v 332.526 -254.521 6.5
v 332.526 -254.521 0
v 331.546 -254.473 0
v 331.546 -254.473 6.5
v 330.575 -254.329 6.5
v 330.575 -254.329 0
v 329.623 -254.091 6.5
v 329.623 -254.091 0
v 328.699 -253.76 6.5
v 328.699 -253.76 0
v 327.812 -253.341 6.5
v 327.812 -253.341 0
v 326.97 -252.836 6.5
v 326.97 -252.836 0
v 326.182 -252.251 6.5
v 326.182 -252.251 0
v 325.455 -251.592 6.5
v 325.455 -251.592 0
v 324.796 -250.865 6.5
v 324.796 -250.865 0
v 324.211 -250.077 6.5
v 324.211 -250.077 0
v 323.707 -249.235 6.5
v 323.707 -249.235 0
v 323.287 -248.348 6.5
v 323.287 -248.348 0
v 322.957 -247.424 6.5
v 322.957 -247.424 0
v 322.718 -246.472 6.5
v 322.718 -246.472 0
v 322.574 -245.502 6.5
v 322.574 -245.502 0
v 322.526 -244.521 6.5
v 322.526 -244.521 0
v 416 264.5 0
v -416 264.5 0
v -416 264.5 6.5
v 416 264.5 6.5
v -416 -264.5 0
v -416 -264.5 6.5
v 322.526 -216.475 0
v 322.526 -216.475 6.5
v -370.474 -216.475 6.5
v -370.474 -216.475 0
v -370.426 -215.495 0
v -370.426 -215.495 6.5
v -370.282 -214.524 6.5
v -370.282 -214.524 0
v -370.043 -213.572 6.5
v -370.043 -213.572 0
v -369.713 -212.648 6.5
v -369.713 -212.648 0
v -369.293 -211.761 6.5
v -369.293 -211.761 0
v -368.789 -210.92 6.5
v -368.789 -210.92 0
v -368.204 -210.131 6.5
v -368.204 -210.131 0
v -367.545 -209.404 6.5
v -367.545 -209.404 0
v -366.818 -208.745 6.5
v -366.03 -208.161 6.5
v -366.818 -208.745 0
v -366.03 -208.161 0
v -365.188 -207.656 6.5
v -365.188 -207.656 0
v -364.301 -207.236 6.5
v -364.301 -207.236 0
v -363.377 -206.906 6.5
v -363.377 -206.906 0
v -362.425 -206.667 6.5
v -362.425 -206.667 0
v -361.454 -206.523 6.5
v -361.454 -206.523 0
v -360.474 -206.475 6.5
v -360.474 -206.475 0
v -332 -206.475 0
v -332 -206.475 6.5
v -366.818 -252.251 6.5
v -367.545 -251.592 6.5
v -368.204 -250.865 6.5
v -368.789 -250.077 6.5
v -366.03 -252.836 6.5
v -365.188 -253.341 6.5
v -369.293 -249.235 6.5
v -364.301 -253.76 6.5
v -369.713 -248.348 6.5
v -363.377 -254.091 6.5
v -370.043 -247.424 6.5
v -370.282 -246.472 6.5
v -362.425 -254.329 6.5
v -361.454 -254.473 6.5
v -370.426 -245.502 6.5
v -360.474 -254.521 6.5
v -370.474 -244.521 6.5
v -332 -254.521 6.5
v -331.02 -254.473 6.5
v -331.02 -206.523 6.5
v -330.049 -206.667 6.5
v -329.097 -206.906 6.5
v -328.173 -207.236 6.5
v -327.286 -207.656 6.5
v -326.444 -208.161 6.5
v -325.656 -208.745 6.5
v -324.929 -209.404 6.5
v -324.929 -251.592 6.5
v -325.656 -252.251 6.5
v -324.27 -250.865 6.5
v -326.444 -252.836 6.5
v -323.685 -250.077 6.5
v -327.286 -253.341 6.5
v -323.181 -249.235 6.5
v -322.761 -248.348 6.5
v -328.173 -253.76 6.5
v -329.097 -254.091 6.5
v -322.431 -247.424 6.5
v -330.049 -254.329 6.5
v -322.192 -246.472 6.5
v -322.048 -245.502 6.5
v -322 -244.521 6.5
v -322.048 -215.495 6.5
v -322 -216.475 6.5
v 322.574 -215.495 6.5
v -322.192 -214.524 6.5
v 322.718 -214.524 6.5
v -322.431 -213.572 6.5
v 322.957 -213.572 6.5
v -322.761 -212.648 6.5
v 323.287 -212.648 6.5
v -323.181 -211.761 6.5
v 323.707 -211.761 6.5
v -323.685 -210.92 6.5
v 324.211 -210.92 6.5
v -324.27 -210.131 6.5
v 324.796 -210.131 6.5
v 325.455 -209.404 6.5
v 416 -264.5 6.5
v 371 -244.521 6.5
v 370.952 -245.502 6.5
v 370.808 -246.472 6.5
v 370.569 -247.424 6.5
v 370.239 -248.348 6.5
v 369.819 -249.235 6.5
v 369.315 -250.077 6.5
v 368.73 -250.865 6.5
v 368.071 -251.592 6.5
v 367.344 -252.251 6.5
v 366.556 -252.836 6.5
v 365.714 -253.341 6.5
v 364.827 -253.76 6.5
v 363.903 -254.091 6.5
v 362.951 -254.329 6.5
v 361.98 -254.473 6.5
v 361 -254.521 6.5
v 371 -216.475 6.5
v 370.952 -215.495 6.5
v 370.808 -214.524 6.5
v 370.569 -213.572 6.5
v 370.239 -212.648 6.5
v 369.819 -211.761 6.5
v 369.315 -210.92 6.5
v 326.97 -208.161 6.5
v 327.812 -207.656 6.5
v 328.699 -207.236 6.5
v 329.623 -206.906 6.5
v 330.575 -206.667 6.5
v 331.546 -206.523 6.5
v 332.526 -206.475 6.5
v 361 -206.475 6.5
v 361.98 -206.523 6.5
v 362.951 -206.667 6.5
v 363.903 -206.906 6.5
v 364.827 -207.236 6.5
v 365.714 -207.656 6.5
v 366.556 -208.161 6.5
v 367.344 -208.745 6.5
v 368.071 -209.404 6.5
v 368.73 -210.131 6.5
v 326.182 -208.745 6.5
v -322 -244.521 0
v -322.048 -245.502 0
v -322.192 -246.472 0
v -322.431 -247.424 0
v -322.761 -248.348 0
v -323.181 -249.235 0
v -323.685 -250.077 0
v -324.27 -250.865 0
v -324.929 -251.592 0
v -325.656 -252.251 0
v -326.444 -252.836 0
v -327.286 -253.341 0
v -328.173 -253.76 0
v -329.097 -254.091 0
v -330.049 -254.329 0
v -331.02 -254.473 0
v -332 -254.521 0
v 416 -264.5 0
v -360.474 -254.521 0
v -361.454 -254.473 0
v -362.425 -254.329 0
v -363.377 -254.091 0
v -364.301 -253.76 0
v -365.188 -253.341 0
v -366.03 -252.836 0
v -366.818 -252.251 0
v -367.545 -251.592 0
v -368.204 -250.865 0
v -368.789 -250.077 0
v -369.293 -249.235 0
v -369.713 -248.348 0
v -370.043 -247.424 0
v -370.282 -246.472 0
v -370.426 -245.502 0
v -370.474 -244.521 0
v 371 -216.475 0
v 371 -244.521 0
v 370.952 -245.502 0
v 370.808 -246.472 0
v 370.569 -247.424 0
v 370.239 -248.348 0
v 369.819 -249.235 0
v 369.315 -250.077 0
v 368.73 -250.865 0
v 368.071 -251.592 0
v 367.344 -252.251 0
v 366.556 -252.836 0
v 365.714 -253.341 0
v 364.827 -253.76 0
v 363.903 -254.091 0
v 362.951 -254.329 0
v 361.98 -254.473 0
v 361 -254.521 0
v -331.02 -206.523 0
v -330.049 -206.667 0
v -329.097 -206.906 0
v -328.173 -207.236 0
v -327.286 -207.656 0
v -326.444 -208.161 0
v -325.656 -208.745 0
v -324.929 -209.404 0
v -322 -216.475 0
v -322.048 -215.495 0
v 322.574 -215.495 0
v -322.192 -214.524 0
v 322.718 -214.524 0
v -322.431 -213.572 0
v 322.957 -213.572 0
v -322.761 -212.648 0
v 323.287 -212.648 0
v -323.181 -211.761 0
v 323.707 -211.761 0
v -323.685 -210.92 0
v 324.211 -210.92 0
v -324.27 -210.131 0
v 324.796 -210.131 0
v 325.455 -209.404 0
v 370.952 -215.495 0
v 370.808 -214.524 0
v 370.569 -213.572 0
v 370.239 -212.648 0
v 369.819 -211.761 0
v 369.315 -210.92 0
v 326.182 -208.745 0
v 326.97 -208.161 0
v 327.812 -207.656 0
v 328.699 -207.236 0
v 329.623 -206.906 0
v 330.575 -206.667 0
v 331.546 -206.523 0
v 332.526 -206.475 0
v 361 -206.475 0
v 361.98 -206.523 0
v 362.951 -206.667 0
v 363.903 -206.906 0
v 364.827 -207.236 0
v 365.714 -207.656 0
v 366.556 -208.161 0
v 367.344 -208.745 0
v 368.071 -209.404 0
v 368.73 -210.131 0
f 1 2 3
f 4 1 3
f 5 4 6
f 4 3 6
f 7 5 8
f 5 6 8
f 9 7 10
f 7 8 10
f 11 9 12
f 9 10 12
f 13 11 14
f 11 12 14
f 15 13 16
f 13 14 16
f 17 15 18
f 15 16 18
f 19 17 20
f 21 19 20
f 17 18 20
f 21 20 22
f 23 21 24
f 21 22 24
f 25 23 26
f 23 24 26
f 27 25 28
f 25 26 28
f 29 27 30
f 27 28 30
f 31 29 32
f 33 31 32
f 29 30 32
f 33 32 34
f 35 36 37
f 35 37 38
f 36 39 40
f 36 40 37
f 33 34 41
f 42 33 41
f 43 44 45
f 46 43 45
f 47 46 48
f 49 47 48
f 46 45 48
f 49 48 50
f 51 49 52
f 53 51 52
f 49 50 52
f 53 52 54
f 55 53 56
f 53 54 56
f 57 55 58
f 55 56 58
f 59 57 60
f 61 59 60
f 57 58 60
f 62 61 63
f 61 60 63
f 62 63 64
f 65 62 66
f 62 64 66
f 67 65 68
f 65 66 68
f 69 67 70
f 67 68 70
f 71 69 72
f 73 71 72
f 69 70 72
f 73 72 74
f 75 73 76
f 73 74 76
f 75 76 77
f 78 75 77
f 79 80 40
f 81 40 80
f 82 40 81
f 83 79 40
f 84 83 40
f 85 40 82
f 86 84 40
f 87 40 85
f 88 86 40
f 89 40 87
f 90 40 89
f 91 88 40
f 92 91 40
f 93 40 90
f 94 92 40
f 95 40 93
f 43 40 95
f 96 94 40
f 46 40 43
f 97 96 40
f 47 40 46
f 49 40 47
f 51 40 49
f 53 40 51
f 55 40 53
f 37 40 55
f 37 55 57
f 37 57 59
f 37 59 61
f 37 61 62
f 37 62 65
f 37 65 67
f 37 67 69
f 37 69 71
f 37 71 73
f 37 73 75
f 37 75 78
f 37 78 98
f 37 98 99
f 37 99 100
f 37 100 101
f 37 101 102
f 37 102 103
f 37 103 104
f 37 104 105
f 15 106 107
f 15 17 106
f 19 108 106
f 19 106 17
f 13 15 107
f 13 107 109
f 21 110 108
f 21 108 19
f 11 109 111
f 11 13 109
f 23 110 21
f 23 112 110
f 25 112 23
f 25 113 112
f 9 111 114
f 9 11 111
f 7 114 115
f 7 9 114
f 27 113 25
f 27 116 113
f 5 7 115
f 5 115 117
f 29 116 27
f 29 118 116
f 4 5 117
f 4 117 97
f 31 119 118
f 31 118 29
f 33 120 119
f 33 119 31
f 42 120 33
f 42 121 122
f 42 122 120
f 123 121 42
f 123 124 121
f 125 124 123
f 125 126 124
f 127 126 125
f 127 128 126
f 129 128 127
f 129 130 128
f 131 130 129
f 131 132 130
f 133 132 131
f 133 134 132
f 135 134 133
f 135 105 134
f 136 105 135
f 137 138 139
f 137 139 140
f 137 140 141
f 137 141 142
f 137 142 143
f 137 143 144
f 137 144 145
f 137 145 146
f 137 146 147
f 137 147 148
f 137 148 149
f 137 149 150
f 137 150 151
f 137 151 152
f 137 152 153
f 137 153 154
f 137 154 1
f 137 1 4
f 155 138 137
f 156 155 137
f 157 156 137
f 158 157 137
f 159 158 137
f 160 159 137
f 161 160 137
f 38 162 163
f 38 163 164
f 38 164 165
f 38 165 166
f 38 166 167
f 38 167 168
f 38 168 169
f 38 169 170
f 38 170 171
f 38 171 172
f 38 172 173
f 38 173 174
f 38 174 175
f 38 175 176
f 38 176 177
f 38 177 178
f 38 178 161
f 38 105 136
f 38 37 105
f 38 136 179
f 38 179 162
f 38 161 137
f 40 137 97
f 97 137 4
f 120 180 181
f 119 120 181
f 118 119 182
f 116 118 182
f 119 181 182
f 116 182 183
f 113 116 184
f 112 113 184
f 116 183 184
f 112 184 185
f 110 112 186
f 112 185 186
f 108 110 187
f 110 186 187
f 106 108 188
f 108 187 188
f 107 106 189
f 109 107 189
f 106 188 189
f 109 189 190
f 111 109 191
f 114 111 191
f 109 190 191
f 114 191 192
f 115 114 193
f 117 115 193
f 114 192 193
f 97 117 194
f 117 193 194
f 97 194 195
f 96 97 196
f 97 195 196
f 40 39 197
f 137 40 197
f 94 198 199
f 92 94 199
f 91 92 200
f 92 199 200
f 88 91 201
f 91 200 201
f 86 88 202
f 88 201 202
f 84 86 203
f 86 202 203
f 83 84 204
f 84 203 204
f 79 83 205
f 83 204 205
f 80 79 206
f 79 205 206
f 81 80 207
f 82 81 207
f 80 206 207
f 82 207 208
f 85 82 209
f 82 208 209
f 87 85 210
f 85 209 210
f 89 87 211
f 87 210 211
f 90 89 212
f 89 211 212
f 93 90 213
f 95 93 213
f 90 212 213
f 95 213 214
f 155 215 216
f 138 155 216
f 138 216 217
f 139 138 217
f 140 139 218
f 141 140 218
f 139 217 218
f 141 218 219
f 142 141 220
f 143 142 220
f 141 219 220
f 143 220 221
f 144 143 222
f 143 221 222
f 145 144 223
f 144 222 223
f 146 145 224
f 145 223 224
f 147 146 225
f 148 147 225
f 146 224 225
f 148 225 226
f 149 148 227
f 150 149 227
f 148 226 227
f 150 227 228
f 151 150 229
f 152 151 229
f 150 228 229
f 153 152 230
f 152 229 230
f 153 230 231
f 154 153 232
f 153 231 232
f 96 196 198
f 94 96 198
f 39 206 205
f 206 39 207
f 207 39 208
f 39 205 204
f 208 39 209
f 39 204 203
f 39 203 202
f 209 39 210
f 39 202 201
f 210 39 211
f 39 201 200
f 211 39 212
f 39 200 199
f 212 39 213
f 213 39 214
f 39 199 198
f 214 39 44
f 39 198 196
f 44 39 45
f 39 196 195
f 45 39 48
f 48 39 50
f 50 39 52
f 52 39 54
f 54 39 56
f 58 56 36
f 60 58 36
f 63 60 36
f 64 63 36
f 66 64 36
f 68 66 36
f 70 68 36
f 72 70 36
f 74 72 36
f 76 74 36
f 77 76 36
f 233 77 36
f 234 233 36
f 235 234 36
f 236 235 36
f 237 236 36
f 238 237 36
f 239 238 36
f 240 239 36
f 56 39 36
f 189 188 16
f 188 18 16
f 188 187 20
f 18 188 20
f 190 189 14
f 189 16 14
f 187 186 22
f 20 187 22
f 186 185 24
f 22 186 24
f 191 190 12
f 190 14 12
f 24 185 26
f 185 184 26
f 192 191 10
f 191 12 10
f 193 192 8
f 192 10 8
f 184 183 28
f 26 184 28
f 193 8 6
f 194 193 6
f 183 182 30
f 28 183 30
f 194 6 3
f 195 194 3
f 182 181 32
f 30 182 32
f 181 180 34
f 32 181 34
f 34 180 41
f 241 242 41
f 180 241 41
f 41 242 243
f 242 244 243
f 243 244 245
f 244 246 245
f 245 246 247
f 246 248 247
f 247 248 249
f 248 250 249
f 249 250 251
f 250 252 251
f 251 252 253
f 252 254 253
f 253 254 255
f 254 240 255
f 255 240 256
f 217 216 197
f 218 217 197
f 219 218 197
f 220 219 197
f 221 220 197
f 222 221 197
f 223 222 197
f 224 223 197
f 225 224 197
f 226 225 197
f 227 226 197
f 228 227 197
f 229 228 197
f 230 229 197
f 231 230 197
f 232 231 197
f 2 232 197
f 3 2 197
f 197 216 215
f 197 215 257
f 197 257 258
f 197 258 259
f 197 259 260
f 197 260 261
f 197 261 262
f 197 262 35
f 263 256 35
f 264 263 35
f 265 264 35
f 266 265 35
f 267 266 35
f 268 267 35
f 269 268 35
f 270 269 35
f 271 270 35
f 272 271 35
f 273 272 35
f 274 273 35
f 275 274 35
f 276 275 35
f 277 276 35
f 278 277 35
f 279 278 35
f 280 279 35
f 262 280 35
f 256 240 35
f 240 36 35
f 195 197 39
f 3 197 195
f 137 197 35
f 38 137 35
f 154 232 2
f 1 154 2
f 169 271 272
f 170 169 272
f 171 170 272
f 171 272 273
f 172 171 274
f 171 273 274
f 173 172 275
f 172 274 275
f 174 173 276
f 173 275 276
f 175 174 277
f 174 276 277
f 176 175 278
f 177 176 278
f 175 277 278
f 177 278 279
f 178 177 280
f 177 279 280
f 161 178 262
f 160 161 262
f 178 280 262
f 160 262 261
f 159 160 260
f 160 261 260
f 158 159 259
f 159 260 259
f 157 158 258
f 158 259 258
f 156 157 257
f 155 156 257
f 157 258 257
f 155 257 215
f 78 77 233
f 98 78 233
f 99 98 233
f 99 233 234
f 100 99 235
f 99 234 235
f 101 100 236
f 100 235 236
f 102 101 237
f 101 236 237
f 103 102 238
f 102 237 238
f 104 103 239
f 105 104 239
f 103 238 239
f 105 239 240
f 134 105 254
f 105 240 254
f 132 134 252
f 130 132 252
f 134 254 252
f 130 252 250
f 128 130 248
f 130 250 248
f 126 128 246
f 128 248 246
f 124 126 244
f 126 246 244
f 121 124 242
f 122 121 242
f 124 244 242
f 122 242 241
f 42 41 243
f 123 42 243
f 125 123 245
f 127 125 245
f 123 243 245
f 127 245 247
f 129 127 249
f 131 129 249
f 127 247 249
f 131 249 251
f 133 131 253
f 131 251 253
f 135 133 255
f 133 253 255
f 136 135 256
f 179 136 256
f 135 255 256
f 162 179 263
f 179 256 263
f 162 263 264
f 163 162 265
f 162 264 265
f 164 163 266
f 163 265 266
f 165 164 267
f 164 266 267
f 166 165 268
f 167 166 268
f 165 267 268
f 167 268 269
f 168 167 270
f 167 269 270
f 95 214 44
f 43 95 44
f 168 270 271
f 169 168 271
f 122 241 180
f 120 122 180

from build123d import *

# Parameters (mm, degrees)
ESQUISSE1_W                = 832
ESQUISSE1_H                = 529
BOSS_EXTRU_1_DEPTH         = 6.5
ENL_V_MAT_EXTRU_1_DEPTH    = 494.009634794
R_P_TITION_LIN_AIRE1_COUNT = 2
R_P_TITION_LIN_AIRE1_PITCH = 693


with BuildPart() as part:
    # Esquisse1 → Boss.-Extru.1 (new body)
    with BuildSketch(Plane.XY):
        Rectangle(ESQUISSE1_W, ESQUISSE1_H)
    extrude(amount=BOSS_EXTRU_1_DEPTH)

    # Esquisse2 → Enlèv. mat.-Extru.1 (cut, through all)
    with BuildSketch(Plane(origin=(0, 0, 0), x_dir=(-1, 0, 0), z_dir=(0, 0, -1))):
        with BuildLine():
            Line((-361, -254.521350197), (-332.52602316, -254.521350197))
            ThreePointArc((-332.52602316, -254.521350197), (-325.454955349, -251.592418009), (-322.52602316, -244.521350197))
            Line((-322.52602316, -244.521350197), (-322.52602316, -216.475228476))
            ThreePointArc((-322.52602316, -216.475228476), (-325.454955349, -209.404160664), (-332.52602316, -206.475228476))
            Line((-332.52602316, -206.475228476), (-361, -206.475228476))
            ThreePointArc((-361, -206.475228476), (-368.071067812, -209.404160664), (-371, -216.475228476))
            Line((-371, -216.475228476), (-371, -244.521350197))
            ThreePointArc((-371, -244.521350197), (-368.071067812, -251.592418009), (-361, -254.521350197))
        make_face()
    enl_v_mat_extru_1 = extrude(amount=-ENL_V_MAT_EXTRU_1_DEPTH, mode=Mode.SUBTRACT)

    # Répétition linéaire1: Enlèv. mat.-Extru.1 ×2
    with Locations(*[(-i * R_P_TITION_LIN_AIRE1_PITCH, 0, 0) for i in range(1, R_P_TITION_LIN_AIRE1_COUNT)]):
        add(enl_v_mat_extru_1, mode=Mode.SUBTRACT)


solid = part.part
